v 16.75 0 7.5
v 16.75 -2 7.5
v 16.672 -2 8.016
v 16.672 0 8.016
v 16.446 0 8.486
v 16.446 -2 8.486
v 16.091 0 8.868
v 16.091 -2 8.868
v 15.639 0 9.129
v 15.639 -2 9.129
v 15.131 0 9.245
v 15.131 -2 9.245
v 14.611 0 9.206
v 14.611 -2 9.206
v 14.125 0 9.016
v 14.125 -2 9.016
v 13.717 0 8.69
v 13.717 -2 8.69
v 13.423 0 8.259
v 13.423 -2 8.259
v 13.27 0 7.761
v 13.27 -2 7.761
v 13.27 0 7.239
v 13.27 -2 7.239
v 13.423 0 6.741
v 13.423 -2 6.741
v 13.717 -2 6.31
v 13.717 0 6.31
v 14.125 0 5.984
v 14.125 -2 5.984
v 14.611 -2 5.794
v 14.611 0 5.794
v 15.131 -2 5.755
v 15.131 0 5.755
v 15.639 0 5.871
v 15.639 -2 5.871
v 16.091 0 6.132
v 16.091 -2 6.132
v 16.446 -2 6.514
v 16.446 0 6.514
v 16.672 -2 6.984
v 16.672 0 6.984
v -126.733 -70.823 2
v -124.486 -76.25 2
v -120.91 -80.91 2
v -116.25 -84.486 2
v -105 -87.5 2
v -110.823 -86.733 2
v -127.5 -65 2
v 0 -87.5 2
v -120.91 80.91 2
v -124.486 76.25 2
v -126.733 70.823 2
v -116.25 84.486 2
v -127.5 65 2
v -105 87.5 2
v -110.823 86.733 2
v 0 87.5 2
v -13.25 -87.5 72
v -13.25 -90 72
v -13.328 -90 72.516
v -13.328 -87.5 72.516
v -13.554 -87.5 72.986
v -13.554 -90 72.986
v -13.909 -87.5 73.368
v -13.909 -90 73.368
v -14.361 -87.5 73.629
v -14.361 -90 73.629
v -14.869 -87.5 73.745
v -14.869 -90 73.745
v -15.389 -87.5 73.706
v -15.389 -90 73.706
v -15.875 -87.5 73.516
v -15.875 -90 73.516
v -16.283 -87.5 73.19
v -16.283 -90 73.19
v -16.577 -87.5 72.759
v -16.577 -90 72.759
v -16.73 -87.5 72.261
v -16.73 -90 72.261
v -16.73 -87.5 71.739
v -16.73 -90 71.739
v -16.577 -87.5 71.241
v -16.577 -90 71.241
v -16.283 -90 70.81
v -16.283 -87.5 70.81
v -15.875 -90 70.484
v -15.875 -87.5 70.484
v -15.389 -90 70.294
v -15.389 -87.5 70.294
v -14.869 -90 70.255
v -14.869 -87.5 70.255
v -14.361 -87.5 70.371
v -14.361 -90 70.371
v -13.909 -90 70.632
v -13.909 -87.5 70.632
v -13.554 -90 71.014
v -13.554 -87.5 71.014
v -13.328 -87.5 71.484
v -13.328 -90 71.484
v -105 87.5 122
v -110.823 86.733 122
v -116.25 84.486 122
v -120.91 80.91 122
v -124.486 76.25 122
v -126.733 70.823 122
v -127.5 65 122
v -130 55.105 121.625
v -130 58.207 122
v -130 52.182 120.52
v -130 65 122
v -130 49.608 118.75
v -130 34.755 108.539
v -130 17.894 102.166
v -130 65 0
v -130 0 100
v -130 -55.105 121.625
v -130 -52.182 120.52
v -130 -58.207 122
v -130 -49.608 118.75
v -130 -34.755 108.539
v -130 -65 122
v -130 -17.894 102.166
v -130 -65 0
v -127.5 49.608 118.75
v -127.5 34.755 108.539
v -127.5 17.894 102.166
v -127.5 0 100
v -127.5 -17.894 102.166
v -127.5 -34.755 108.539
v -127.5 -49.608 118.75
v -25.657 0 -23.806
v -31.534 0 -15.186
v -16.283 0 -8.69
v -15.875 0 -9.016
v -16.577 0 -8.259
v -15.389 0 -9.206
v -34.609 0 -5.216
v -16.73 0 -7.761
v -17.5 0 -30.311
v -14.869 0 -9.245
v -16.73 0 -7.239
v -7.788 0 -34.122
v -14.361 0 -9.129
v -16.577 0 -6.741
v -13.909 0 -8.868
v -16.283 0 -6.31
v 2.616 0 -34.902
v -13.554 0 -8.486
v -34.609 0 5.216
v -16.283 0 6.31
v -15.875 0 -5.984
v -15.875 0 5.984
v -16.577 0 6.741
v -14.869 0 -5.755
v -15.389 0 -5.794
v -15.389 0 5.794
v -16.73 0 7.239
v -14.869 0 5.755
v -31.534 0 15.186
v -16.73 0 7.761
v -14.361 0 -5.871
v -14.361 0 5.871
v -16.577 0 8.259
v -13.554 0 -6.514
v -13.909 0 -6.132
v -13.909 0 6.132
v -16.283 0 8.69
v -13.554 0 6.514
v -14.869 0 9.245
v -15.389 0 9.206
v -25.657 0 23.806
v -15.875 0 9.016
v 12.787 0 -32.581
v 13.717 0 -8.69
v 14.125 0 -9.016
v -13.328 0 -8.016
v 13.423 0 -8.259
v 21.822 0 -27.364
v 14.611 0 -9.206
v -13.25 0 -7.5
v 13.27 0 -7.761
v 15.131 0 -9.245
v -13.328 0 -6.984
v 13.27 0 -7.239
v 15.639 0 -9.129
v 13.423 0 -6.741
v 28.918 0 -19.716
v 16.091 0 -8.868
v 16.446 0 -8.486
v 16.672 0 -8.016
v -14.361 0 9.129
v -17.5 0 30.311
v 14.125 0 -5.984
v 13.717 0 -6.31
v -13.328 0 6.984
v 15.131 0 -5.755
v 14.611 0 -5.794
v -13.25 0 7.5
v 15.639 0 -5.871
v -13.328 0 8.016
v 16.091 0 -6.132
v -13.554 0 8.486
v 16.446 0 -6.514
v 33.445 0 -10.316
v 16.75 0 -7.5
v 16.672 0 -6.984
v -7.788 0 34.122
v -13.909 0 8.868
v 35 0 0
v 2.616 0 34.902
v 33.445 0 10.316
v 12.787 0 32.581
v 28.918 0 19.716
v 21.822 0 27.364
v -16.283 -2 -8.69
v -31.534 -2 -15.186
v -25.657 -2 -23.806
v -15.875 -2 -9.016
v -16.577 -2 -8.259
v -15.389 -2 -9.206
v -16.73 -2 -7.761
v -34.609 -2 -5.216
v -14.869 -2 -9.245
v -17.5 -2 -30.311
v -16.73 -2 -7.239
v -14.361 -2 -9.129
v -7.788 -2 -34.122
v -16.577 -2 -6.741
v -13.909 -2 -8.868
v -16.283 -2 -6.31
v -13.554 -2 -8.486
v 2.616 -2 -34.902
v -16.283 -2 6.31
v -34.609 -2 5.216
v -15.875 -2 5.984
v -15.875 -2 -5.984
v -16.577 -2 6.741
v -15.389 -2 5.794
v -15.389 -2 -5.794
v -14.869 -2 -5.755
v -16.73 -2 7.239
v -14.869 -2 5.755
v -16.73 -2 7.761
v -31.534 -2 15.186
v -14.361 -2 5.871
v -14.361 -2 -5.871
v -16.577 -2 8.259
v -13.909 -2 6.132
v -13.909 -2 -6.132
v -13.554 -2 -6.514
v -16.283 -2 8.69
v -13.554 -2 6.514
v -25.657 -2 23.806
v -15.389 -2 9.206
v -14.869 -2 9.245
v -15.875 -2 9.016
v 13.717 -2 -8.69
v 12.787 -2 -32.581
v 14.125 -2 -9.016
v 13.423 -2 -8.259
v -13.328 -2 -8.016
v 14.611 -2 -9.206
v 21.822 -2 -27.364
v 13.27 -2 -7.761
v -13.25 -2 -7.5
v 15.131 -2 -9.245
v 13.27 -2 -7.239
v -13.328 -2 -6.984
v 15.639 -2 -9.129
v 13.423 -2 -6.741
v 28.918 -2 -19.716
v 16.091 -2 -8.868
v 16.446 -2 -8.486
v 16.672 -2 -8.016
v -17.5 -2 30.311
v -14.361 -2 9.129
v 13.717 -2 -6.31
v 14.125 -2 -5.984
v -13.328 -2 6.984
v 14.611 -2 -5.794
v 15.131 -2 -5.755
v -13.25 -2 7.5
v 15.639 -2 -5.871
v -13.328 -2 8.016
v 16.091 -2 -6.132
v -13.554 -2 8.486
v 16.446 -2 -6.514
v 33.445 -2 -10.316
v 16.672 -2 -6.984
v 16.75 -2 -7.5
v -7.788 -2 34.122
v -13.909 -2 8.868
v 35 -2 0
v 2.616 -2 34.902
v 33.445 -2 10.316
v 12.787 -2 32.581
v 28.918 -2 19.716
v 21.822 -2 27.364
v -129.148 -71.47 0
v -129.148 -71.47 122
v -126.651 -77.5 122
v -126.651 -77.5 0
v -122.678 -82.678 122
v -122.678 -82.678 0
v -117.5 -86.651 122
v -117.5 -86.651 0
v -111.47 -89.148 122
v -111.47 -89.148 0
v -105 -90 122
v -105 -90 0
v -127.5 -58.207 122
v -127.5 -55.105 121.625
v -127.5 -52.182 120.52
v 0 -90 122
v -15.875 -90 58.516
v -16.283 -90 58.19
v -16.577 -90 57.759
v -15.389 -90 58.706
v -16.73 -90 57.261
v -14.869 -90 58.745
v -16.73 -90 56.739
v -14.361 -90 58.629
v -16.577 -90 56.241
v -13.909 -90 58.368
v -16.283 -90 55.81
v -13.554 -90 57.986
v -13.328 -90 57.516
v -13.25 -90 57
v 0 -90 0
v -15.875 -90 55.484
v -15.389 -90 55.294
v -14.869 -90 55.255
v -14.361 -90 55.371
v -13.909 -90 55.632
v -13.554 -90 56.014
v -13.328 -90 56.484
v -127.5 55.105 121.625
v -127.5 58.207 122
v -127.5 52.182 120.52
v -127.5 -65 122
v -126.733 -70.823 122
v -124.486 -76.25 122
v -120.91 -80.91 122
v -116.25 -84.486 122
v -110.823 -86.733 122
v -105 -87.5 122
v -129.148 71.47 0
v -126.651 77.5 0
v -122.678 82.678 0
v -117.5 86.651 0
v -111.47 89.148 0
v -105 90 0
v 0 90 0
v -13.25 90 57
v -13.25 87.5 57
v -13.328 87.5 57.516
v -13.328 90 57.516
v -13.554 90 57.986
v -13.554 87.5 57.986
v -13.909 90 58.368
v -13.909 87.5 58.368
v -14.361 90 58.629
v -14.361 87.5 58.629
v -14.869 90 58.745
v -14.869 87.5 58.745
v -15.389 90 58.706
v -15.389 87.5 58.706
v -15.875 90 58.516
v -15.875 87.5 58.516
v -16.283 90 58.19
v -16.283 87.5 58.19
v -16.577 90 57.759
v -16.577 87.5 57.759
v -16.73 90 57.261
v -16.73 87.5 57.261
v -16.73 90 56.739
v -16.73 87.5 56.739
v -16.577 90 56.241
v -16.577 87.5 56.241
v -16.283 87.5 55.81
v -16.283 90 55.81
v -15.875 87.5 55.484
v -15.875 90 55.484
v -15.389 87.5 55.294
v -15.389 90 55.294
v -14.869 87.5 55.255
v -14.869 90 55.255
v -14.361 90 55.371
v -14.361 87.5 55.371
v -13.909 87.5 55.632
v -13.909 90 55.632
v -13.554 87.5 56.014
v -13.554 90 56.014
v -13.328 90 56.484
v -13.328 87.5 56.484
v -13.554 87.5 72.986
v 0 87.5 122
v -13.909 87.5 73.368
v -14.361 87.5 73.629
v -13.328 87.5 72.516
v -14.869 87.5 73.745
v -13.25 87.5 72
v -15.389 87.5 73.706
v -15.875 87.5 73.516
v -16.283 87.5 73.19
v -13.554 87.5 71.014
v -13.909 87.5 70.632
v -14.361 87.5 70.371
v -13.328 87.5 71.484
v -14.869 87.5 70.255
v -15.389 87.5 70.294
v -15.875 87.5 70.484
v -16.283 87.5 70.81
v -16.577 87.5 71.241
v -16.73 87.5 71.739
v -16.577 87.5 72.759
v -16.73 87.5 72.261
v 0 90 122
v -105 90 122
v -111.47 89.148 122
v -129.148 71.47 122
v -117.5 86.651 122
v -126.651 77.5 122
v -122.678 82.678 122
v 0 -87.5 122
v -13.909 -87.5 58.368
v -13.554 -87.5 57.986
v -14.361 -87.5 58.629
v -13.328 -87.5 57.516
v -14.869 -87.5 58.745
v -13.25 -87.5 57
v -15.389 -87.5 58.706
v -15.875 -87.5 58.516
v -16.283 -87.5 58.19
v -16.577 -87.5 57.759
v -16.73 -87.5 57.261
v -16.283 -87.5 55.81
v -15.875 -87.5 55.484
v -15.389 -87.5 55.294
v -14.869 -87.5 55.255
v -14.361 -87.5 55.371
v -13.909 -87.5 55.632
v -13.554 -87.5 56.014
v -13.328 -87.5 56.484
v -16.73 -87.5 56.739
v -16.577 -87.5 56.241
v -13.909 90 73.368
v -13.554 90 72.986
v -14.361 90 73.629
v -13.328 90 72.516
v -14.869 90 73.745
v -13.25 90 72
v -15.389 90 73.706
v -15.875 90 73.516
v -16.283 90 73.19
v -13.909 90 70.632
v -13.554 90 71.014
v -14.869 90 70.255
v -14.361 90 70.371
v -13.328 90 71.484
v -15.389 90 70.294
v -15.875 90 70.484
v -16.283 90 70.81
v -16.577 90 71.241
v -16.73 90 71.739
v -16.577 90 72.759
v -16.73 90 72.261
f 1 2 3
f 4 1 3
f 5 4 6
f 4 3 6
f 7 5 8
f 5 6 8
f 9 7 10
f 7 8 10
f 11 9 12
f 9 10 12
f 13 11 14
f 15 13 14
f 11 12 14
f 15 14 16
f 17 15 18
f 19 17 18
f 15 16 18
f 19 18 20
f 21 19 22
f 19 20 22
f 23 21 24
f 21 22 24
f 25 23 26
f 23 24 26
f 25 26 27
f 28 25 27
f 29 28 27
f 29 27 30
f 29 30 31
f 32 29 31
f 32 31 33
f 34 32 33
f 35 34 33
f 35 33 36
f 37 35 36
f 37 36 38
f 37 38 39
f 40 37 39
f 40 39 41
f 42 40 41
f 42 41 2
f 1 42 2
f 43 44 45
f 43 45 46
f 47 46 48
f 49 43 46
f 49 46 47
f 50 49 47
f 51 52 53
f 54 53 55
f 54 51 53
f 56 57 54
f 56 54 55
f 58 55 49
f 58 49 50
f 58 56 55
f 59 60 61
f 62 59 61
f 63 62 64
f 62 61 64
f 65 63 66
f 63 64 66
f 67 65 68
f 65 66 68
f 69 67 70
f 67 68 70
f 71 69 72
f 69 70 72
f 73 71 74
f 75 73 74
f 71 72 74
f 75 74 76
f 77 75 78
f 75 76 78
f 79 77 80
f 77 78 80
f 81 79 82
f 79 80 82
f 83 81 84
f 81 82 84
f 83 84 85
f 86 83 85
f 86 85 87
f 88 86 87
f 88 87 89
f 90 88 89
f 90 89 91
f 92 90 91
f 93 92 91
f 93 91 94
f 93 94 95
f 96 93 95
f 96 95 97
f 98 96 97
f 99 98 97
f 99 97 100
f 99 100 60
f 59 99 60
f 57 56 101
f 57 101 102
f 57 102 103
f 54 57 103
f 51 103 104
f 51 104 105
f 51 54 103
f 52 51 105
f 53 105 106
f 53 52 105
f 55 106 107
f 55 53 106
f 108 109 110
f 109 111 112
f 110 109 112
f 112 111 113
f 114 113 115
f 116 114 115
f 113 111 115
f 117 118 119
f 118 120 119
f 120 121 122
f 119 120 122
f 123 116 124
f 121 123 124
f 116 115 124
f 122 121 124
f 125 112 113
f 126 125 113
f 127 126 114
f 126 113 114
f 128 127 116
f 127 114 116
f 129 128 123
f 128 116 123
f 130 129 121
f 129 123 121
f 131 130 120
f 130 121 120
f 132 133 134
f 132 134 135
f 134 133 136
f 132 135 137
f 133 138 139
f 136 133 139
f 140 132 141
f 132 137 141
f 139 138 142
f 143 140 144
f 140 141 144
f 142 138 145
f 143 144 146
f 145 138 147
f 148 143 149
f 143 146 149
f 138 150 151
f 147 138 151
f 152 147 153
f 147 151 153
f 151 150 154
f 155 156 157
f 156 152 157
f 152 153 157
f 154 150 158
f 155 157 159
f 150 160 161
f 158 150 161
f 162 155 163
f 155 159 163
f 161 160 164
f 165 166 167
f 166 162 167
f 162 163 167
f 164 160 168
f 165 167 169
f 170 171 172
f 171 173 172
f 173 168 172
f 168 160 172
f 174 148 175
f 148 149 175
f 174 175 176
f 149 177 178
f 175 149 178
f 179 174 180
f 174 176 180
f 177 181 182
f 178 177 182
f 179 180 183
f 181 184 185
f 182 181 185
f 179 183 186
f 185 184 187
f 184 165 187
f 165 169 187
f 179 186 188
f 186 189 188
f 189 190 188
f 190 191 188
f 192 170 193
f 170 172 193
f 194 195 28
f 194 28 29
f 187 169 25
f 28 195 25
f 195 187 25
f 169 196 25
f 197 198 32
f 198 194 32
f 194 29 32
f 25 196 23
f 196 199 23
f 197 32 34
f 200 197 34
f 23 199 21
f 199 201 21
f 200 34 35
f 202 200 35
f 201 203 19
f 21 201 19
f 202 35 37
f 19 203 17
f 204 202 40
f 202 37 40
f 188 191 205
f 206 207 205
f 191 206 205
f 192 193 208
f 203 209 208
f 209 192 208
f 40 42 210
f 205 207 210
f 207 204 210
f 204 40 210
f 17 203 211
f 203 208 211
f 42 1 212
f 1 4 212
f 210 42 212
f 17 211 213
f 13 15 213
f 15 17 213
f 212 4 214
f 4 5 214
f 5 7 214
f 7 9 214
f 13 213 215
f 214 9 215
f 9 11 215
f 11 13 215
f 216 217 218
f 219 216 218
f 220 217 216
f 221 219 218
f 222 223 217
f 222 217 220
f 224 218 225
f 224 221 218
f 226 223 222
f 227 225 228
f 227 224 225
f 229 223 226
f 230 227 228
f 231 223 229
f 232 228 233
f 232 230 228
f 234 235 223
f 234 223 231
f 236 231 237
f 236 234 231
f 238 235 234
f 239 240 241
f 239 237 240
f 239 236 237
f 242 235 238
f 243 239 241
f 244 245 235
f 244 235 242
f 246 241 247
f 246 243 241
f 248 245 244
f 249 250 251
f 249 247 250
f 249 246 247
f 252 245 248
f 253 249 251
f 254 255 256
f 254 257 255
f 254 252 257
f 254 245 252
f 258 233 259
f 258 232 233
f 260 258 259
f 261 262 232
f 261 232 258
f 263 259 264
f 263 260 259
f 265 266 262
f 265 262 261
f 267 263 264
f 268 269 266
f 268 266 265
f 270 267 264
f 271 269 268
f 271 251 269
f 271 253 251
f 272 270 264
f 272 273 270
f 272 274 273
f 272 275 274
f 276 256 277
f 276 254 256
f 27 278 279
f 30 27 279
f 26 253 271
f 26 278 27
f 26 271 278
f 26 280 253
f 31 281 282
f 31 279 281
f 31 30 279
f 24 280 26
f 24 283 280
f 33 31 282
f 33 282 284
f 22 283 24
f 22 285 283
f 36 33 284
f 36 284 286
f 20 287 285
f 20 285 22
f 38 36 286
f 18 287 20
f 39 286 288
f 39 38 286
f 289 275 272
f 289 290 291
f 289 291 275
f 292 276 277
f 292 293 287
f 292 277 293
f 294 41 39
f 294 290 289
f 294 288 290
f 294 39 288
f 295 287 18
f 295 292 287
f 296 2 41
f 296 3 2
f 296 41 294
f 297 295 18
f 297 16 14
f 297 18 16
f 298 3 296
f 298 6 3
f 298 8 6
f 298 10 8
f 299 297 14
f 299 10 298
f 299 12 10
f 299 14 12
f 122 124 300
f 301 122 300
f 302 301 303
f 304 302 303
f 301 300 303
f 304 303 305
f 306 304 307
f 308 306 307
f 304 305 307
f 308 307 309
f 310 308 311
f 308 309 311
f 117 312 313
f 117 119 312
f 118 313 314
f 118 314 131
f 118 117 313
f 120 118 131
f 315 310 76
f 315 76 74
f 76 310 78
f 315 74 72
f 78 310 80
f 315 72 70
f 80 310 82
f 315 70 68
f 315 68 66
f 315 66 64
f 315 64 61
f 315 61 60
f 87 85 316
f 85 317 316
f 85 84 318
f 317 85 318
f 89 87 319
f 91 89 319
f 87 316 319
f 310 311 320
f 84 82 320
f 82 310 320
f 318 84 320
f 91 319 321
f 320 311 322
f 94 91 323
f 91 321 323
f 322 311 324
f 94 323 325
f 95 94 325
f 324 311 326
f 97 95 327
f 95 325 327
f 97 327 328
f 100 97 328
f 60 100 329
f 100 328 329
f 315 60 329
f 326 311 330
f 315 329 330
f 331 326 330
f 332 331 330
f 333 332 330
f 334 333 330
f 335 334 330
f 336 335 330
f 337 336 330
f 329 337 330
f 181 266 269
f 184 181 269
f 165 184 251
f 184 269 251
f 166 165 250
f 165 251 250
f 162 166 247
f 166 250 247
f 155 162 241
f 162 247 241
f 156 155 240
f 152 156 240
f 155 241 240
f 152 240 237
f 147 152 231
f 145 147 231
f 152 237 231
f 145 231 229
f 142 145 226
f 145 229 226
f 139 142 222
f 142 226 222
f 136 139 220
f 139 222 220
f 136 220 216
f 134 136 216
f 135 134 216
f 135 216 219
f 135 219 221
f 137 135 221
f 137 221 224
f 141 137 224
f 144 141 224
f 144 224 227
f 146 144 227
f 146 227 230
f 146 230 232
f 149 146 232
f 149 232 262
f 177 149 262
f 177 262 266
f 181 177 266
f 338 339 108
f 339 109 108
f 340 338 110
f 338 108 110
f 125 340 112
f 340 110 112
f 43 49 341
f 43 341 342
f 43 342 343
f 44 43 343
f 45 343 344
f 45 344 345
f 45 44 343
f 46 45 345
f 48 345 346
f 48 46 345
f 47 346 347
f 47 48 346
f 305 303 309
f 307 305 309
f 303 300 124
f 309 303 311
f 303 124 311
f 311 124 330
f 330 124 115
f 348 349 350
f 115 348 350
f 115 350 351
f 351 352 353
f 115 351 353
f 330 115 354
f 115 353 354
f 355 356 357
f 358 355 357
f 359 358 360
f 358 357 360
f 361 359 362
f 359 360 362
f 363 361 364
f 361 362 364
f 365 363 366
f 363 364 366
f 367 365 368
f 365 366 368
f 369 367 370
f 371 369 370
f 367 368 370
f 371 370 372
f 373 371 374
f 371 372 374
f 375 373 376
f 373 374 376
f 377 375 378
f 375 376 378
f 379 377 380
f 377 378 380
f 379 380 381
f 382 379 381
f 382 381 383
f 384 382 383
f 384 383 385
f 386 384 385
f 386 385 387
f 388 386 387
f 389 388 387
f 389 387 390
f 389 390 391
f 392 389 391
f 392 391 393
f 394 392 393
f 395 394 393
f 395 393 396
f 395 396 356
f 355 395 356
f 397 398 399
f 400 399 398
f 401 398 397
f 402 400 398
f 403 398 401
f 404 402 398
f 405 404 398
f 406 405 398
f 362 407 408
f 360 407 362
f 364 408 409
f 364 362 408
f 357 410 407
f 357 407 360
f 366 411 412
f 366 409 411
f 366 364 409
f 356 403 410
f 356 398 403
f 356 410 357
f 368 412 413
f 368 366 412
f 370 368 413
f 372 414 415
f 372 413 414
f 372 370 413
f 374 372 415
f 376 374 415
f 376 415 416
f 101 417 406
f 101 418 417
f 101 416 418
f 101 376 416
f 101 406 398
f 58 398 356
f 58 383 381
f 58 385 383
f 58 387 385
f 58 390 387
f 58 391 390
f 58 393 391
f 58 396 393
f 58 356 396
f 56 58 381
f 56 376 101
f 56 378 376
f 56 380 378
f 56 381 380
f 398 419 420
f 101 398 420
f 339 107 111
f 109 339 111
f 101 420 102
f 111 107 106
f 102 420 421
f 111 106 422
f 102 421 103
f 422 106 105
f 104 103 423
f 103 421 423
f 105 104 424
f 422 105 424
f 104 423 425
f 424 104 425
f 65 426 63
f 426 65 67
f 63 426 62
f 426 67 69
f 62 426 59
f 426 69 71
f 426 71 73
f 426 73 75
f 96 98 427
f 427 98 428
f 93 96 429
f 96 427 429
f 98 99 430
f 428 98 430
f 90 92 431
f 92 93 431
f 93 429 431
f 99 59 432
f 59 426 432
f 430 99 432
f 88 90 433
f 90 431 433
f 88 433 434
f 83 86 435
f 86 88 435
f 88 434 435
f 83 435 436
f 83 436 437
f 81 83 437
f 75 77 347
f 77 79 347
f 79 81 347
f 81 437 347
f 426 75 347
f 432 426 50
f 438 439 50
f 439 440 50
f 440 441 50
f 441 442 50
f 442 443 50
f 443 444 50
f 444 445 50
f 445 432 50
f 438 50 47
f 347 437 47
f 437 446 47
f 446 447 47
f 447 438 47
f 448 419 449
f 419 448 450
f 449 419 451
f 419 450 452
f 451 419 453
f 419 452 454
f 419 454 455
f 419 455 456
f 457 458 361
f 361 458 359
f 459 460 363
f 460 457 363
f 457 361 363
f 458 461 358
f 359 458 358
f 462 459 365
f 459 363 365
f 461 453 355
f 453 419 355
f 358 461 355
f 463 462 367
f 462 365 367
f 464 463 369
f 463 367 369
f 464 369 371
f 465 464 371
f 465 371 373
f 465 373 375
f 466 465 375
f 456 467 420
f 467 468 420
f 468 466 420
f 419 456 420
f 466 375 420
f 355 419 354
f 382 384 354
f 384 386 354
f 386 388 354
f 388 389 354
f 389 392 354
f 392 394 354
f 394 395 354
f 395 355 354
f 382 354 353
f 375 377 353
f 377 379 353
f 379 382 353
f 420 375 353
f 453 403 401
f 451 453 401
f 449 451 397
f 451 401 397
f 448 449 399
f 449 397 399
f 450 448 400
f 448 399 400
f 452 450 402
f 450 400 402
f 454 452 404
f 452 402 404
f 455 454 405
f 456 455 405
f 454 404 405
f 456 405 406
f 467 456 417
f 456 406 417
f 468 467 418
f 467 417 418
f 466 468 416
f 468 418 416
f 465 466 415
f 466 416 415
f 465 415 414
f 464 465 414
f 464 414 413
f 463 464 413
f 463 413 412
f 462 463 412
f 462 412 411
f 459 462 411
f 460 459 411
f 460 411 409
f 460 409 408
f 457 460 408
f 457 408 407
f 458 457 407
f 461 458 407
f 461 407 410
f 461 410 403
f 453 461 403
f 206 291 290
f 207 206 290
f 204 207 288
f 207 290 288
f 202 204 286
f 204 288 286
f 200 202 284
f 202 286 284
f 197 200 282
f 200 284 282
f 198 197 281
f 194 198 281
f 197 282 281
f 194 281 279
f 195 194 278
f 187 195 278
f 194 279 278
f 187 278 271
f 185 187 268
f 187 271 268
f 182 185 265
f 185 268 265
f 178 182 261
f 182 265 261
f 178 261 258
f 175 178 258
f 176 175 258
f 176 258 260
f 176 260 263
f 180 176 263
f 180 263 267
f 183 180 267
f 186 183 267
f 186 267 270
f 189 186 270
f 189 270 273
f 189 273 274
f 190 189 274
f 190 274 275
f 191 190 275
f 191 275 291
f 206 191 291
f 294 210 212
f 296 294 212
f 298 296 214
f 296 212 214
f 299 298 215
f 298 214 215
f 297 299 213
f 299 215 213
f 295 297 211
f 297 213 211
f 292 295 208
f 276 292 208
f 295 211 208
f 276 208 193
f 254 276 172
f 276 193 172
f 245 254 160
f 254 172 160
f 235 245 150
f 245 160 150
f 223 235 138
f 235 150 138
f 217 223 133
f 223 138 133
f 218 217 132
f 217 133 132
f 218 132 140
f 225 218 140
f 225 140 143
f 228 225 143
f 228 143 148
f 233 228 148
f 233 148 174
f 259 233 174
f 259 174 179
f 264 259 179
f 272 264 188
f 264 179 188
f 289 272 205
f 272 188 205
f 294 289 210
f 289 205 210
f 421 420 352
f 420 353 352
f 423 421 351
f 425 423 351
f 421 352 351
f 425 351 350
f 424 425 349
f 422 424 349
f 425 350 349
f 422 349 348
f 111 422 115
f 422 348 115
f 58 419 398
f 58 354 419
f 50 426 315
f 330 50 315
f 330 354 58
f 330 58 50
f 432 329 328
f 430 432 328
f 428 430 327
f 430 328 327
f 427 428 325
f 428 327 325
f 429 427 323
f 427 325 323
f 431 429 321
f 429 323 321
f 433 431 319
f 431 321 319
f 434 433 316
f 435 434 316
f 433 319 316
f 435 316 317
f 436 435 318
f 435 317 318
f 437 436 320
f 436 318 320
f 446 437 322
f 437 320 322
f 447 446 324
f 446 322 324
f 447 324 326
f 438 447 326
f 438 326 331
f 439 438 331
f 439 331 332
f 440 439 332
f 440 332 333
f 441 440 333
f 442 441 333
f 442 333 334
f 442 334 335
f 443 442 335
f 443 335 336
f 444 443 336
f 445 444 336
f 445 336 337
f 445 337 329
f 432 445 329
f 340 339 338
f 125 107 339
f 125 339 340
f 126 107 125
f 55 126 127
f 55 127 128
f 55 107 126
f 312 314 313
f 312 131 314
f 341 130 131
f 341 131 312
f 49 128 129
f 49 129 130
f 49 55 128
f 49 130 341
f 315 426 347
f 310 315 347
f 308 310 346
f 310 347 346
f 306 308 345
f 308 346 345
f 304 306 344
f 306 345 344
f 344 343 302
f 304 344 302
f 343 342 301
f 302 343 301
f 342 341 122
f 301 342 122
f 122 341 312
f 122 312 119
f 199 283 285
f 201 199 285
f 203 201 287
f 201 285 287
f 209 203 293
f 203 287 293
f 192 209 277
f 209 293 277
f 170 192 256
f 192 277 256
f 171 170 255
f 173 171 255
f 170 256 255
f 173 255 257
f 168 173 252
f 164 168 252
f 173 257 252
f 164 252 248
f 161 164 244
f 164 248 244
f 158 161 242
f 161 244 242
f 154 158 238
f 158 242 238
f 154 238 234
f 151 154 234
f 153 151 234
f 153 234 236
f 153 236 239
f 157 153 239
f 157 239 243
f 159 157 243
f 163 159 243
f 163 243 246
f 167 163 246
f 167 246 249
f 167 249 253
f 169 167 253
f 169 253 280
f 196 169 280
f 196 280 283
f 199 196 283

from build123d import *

# Parameters (mm, degrees)
PAD_DEPTH       = 2
PAD001_DEPTH    = 120
SKETCH004_R     = 1.75
POCKET001_DEPTH = 180.001
SKETCH006_R     = 75
POCKET002_DEPTH = 130.001
FILLET_R        = 13
SKETCH002_R     = 35
PAD002_DEPTH    = 2
SKETCH003_R     = 1.75
POCKET_DEPTH    = 2.001


with BuildPart() as body:
    # Sketch → Pad (new body)
    with BuildSketch(Plane.XY):
        with BuildLine():
            Line((0, 90), (-105, 90))
            ThreePointArc((-105, 90), (-122.67767, 82.67767), (-130, 65))
            Line((-130, 65), (-130, -65))
            ThreePointArc((-130, -65), (-122.67767, -82.67767), (-105, -90))
            Line((-105, -90), (0, -90))
            Line((0, 90), (0, -90))
        make_face()
    extrude(amount=PAD_DEPTH)

    # Sketch001 (on Face8 of Pad) → Pad001 (join)
    with BuildSketch(Plane.XY.offset(2)):
        with BuildLine():
            Line((0, 90), (0, 87.5))
            Line((0, 87.5), (-105, 87.5))
            ThreePointArc((-105, 87.5), (-120.909903, 80.909903), (-127.5, 65))
            Line((-127.5, 65), (-127.5, -65))
            ThreePointArc((-127.5, -65), (-120.909903, -80.909903), (-105, -87.5))
            Line((0, -87.5), (-105, -87.5))
            Line((0, -90), (0, -87.5))
            Line((0, -90), (-105, -90))
            ThreePointArc((-130, -65), (-122.67767, -82.67767), (-105, -90))
            Line((-130, 65), (-130, -65))
            ThreePointArc((-105, 90), (-122.67767, 82.67767), (-130, 65))
            Line((0, 90), (-105, 90))
        make_face()
    extrude(amount=PAD001_DEPTH)

    # Sketch004 (on Face14 of Pad001) → Pocket001 (cut, through all)
    with BuildSketch(Plane.XZ.offset(90)):
        with Locations((-15, 72)):
            Circle(SKETCH004_R)
        with Locations((-15, 57)):
            Circle(SKETCH004_R)
    extrude(amount=-POCKET001_DEPTH, mode=Mode.SUBTRACT)

    # Sketch006 (on Face22 of Pocket001) → Pocket002 (cut, through all)
    with BuildSketch(Plane(origin=(-130, 0, 0), x_dir=(0, -1, 0), z_dir=(-1, 0, 0))):
        with Locations((0, 175)):
            Circle(SKETCH006_R)
    extrude(amount=-POCKET002_DEPTH, mode=Mode.SUBTRACT)

    # Fillet
    fillet_edges = [body.edges().sort_by_distance(p)[0] for p in [
        (-128.75, 53.065997, 122),
        (-128.75, -53.065997, 122),
    ]]
    fillet(fillet_edges, radius=FILLET_R)


with BuildPart() as connector:
    # Sketch002 → Pad002 (new body)
    with BuildSketch(Plane.XZ):
        Circle(SKETCH002_R)
    extrude(amount=PAD002_DEPTH)

    # Sketch003 (on Face3 of Pad002) → Pocket (cut, through all)
    with BuildSketch(Plane.XZ.offset(2)):
        with Locations((-15, 7.5)):
            Circle(SKETCH003_R)
        with Locations((-15, -7.5)):
            Circle(SKETCH003_R)
        with Locations((15, -7.5)):
            Circle(SKETCH003_R)
        with Locations((15, 7.5)):
            Circle(SKETCH003_R)
    extrude(amount=-POCKET_DEPTH, mode=Mode.SUBTRACT)


solid = Compound([body.part, connector.part])
